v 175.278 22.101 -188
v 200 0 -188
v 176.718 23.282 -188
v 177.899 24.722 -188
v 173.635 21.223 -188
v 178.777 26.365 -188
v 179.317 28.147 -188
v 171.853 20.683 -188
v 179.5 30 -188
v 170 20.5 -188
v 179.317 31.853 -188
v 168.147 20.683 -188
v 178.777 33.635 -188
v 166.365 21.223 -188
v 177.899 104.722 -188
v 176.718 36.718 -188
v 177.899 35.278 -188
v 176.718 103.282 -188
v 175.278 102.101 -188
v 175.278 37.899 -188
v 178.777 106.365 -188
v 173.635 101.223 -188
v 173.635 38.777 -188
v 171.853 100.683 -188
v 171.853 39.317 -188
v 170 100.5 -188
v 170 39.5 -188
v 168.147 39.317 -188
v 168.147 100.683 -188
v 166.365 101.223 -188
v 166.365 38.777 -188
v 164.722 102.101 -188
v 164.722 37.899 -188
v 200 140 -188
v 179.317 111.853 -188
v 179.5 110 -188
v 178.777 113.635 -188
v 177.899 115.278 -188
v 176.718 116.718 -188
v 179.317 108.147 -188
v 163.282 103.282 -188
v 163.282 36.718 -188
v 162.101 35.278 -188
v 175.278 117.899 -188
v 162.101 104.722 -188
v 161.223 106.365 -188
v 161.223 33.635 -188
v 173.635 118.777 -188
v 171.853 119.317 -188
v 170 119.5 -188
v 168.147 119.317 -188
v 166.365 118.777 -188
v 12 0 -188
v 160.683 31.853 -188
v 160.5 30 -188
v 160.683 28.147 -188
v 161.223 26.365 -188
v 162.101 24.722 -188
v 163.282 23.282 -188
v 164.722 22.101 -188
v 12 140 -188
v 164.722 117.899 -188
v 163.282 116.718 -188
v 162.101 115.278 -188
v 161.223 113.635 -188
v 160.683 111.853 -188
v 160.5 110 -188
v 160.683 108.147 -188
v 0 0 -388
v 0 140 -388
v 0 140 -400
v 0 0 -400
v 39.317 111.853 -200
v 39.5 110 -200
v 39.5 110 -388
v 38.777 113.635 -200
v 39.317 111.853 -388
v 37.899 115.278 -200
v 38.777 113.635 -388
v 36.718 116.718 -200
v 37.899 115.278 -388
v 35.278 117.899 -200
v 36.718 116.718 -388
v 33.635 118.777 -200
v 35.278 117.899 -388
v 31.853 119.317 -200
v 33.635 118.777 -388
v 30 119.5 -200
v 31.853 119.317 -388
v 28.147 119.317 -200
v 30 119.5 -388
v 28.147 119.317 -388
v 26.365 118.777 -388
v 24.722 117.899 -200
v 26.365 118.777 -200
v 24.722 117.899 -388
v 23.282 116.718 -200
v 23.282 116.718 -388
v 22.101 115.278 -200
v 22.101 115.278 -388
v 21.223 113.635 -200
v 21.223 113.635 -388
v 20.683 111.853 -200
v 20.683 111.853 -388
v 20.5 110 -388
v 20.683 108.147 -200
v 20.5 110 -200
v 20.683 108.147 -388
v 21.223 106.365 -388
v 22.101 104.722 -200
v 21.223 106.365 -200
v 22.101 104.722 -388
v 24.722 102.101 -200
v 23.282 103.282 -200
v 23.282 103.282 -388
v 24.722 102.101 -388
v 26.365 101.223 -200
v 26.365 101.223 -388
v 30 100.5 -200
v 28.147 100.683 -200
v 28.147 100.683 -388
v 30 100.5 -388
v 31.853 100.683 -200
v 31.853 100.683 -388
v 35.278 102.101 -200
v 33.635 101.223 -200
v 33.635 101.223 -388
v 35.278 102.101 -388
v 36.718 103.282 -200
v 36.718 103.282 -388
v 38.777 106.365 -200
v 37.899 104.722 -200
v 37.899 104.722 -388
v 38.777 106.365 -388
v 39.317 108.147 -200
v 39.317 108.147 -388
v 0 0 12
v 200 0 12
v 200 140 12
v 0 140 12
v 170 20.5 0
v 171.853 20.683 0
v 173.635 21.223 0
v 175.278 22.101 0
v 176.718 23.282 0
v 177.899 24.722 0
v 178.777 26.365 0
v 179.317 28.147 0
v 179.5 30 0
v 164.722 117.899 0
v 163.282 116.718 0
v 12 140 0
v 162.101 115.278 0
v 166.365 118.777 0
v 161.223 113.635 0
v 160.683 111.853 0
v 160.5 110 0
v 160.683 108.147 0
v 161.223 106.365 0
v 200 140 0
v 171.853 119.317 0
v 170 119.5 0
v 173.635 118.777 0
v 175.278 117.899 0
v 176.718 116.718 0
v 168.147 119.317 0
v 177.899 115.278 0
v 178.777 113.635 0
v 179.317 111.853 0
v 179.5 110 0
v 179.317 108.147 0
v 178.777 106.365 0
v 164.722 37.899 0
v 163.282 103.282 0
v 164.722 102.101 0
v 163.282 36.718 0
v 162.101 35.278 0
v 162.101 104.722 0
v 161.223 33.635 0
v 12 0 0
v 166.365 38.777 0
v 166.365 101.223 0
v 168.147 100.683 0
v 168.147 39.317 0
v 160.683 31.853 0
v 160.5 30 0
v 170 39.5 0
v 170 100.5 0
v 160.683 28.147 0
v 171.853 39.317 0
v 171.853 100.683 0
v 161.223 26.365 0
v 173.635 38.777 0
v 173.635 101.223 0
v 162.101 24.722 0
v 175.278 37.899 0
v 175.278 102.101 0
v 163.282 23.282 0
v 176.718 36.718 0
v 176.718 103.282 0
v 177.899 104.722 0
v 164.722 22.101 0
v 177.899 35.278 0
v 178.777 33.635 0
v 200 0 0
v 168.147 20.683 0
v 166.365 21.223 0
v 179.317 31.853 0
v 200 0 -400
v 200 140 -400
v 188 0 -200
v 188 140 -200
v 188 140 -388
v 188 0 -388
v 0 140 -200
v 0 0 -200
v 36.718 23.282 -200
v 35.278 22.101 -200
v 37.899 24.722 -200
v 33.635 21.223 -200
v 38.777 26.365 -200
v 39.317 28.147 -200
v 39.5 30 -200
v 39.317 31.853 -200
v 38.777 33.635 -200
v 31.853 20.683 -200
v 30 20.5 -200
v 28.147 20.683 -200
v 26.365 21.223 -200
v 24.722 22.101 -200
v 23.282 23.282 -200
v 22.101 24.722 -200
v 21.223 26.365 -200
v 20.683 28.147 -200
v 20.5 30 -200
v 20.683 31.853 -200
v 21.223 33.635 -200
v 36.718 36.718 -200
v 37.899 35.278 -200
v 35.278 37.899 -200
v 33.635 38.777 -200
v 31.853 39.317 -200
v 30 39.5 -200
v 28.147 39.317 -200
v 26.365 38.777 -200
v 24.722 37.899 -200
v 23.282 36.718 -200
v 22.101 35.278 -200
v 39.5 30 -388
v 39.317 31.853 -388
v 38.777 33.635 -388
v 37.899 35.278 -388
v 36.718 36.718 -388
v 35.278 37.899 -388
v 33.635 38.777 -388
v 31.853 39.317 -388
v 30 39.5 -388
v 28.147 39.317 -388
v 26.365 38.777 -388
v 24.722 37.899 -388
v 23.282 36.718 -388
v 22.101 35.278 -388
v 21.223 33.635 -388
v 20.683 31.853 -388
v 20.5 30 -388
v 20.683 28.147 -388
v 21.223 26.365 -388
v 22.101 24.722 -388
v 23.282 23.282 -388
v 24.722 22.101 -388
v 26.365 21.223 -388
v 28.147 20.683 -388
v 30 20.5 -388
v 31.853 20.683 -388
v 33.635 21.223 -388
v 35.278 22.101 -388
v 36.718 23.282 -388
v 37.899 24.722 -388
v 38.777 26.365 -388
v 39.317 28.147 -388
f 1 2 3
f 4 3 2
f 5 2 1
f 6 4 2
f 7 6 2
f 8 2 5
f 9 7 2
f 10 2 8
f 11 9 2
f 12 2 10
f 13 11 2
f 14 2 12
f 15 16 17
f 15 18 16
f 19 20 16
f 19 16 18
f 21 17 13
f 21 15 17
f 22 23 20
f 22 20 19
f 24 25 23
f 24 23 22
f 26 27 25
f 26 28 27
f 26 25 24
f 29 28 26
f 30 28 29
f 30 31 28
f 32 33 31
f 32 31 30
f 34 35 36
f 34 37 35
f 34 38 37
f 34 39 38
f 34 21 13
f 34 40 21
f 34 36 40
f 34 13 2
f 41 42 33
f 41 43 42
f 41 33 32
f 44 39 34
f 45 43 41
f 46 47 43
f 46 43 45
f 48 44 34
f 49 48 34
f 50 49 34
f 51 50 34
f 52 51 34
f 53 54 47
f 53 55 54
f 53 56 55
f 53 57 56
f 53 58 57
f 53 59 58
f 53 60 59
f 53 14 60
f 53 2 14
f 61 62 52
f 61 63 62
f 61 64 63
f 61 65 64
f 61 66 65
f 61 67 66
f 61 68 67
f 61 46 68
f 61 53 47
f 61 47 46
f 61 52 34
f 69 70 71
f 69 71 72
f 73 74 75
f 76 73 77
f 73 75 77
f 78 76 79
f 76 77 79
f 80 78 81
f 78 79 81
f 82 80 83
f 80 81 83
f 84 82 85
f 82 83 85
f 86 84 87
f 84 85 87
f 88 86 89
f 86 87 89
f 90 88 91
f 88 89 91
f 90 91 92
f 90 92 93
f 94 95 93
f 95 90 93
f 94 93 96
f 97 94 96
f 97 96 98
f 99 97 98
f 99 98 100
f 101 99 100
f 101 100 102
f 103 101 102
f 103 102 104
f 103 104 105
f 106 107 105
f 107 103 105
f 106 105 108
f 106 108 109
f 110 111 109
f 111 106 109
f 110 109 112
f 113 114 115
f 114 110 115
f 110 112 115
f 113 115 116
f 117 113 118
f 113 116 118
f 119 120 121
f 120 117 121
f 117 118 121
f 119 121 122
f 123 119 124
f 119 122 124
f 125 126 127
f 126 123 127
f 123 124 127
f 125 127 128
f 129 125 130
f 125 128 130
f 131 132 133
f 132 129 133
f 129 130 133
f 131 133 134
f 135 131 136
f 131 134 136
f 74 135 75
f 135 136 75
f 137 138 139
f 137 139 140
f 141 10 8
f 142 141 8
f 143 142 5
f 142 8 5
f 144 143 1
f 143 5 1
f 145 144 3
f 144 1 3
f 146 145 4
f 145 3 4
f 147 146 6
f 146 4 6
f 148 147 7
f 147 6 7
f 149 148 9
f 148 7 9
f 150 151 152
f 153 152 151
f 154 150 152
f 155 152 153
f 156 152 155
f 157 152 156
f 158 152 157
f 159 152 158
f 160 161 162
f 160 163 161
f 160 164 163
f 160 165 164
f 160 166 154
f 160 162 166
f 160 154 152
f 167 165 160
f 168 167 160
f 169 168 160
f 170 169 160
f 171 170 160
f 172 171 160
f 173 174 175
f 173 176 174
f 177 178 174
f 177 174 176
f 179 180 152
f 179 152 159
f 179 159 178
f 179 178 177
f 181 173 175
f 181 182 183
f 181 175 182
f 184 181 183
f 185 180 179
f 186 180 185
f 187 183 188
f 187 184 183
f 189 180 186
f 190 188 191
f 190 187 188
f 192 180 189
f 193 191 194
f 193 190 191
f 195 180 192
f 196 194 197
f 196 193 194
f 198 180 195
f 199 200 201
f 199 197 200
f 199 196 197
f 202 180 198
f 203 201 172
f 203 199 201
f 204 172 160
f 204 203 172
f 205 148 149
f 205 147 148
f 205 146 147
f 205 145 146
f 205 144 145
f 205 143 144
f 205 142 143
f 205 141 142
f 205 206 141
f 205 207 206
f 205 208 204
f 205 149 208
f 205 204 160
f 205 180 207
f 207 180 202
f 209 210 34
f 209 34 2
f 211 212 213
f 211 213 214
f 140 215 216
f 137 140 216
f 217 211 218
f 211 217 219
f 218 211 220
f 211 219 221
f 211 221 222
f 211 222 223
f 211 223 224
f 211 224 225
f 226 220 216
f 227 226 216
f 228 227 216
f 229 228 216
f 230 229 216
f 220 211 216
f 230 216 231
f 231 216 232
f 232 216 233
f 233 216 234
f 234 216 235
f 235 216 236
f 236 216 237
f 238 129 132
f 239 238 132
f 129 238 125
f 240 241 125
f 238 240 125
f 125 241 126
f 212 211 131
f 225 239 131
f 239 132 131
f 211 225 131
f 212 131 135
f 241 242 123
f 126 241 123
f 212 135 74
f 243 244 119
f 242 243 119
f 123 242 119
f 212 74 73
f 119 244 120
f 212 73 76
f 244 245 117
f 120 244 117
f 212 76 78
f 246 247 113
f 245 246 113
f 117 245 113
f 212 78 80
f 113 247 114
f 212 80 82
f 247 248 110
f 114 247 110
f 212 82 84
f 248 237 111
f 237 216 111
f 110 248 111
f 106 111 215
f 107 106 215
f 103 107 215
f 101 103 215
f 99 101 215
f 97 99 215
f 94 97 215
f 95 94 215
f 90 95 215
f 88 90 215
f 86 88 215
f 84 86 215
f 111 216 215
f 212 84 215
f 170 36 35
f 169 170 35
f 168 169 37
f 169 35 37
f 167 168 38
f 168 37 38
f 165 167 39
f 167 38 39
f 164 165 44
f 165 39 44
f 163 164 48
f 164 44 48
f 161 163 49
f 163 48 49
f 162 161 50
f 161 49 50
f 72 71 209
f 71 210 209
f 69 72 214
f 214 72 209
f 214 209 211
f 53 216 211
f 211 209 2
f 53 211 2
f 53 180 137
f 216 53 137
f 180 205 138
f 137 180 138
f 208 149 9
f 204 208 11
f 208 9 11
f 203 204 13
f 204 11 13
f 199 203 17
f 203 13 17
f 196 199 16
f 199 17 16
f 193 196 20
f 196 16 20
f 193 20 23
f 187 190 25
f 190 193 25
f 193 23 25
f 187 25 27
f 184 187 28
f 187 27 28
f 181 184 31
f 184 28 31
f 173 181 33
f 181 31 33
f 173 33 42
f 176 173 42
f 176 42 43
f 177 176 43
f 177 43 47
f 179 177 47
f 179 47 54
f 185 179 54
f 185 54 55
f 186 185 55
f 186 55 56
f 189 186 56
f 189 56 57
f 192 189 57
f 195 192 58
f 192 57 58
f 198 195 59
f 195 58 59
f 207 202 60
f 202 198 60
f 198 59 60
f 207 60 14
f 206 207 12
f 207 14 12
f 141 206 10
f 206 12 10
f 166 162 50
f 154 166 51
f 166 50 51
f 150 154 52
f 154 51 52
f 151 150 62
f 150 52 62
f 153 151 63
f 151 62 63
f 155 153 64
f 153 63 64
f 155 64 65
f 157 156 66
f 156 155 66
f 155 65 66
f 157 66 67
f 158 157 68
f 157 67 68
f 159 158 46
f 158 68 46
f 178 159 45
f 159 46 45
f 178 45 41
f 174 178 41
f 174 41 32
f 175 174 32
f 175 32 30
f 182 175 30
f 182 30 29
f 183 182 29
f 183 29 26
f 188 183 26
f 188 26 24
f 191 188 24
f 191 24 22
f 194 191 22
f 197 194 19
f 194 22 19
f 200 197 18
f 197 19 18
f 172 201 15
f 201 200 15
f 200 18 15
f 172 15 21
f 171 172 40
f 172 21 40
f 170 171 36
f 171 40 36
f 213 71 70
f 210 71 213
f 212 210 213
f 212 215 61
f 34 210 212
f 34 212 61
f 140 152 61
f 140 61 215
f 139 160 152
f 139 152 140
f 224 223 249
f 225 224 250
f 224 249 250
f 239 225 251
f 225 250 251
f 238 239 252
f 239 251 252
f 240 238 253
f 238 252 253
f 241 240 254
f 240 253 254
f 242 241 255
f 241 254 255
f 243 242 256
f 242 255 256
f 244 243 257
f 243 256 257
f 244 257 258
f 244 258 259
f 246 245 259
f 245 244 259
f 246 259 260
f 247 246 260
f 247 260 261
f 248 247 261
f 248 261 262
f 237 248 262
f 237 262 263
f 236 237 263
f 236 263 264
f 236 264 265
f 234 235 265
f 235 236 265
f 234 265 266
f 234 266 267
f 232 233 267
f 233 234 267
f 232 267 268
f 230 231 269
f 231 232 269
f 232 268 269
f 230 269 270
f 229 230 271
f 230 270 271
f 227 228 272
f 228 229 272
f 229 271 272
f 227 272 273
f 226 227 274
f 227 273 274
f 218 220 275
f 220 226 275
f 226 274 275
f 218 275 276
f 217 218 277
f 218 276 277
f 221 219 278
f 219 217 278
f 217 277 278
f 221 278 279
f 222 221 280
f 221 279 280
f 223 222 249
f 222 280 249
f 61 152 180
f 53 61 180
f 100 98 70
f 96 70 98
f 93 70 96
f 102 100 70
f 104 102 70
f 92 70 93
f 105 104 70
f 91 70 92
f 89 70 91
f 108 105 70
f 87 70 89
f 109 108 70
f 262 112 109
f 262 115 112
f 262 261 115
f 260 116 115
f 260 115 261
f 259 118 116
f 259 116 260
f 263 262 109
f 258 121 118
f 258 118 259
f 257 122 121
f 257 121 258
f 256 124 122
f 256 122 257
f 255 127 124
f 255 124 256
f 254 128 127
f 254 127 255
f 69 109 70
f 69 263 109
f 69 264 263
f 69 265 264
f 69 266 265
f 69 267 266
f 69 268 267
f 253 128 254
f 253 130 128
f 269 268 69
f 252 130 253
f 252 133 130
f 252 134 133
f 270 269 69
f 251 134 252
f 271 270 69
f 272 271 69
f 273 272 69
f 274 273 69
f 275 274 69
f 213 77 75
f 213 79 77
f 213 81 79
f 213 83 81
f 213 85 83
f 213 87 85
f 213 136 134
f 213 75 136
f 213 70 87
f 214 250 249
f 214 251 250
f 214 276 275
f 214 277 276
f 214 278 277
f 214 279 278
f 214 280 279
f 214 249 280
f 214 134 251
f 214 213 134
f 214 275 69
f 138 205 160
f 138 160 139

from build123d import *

# Parameters (mm, degrees)
F1_DEPTH  = 140
F2_W      = 12
F2_H      = 140
F3_DEPTH  = 206
F4_W      = 140
F4_H      = 12
F5_DEPTH  = 188
F6_W      = 12
F6_H      = 140
F7_DEPTH  = 200
F8_W      = 140
F8_H      = 12
F9_DEPTH  = 188
F10_R     = 9.5
F11_DEPTH = 200
F13_DEPTH = 200


with BuildPart() as f1:
    # F0 (on Front) → F1 (new body)
    with BuildSketch(Plane.XZ):
        Polygon((12, 6), (12, 0), (200, 0), (200, 12), (0, 12), (0, 6), align=None)
    extrude(amount=-F1_DEPTH)

    # F2 (on face) → F3 (join)
    with BuildSketch(Plane(origin=(0, 0, 6), x_dir=(1, 0, 0), z_dir=(0, 0, -1))):
        with Locations((6, -70)):
            Rectangle(F2_W, F2_H)
    extrude(amount=F3_DEPTH)

    # F4 (on face) → F5 (join)
    with BuildSketch(Plane.YZ.offset(12)):
        with Locations((70, -194)):
            Rectangle(F4_W, F4_H)
    extrude(amount=F5_DEPTH)

    # F6 (on face) → F7 (join)
    with BuildSketch(Plane(origin=(0, 0, -200), x_dir=(1, 0, 0), z_dir=(0, 0, -1))):
        with Locations((194, -70)):
            Rectangle(F6_W, F6_H)
    extrude(amount=F7_DEPTH)

    # F8 (on face) → F9 (join)
    with BuildSketch(Plane(origin=(188, 0, 0), x_dir=(0, -1, 0), z_dir=(-1, 0, 0))):
        with Locations((-70, -394)):
            Rectangle(F8_W, F8_H)
    extrude(amount=F9_DEPTH)

    # F10 (on face) → F11 (join)
    with BuildSketch(Plane.XY.offset(-388)):
        with Locations((30, 30)):
            Circle(F10_R)
        with Locations((30, 110)):
            Circle(F10_R)
    extrude(amount=F11_DEPTH)

    # F12 (on face) → F13 (join)
    with BuildSketch(Plane.XY.offset(-188)):
        with BuildLine():
            ThreePointArc((179.5, 110), (176.717514, 116.717514), (170, 119.5))
            Line((170, 119.5), (170, 110))
            Line((170, 110), (179.5, 110))
        make_face()
        with BuildLine():
            Line((170, 110), (170, 119.5))
            ThreePointArc((170, 119.5), (163.282486, 103.282486), (179.5, 110))
            Line((179.5, 110), (170, 110))
        make_face()
        with BuildLine():
            ThreePointArc((170, 20.5), (176.717514, 23.282486), (179.5, 30))
            Line((179.5, 30), (170, 30))
            Line((170, 30), (170, 20.5))
        make_face()
        with BuildLine():
            Line((170, 30), (179.5, 30))
            ThreePointArc((179.5, 30), (163.282486, 36.717514), (170, 20.5))
            Line((170, 20.5), (170, 30))
        make_face()
    extrude(amount=F13_DEPTH)


solid = f1.part
